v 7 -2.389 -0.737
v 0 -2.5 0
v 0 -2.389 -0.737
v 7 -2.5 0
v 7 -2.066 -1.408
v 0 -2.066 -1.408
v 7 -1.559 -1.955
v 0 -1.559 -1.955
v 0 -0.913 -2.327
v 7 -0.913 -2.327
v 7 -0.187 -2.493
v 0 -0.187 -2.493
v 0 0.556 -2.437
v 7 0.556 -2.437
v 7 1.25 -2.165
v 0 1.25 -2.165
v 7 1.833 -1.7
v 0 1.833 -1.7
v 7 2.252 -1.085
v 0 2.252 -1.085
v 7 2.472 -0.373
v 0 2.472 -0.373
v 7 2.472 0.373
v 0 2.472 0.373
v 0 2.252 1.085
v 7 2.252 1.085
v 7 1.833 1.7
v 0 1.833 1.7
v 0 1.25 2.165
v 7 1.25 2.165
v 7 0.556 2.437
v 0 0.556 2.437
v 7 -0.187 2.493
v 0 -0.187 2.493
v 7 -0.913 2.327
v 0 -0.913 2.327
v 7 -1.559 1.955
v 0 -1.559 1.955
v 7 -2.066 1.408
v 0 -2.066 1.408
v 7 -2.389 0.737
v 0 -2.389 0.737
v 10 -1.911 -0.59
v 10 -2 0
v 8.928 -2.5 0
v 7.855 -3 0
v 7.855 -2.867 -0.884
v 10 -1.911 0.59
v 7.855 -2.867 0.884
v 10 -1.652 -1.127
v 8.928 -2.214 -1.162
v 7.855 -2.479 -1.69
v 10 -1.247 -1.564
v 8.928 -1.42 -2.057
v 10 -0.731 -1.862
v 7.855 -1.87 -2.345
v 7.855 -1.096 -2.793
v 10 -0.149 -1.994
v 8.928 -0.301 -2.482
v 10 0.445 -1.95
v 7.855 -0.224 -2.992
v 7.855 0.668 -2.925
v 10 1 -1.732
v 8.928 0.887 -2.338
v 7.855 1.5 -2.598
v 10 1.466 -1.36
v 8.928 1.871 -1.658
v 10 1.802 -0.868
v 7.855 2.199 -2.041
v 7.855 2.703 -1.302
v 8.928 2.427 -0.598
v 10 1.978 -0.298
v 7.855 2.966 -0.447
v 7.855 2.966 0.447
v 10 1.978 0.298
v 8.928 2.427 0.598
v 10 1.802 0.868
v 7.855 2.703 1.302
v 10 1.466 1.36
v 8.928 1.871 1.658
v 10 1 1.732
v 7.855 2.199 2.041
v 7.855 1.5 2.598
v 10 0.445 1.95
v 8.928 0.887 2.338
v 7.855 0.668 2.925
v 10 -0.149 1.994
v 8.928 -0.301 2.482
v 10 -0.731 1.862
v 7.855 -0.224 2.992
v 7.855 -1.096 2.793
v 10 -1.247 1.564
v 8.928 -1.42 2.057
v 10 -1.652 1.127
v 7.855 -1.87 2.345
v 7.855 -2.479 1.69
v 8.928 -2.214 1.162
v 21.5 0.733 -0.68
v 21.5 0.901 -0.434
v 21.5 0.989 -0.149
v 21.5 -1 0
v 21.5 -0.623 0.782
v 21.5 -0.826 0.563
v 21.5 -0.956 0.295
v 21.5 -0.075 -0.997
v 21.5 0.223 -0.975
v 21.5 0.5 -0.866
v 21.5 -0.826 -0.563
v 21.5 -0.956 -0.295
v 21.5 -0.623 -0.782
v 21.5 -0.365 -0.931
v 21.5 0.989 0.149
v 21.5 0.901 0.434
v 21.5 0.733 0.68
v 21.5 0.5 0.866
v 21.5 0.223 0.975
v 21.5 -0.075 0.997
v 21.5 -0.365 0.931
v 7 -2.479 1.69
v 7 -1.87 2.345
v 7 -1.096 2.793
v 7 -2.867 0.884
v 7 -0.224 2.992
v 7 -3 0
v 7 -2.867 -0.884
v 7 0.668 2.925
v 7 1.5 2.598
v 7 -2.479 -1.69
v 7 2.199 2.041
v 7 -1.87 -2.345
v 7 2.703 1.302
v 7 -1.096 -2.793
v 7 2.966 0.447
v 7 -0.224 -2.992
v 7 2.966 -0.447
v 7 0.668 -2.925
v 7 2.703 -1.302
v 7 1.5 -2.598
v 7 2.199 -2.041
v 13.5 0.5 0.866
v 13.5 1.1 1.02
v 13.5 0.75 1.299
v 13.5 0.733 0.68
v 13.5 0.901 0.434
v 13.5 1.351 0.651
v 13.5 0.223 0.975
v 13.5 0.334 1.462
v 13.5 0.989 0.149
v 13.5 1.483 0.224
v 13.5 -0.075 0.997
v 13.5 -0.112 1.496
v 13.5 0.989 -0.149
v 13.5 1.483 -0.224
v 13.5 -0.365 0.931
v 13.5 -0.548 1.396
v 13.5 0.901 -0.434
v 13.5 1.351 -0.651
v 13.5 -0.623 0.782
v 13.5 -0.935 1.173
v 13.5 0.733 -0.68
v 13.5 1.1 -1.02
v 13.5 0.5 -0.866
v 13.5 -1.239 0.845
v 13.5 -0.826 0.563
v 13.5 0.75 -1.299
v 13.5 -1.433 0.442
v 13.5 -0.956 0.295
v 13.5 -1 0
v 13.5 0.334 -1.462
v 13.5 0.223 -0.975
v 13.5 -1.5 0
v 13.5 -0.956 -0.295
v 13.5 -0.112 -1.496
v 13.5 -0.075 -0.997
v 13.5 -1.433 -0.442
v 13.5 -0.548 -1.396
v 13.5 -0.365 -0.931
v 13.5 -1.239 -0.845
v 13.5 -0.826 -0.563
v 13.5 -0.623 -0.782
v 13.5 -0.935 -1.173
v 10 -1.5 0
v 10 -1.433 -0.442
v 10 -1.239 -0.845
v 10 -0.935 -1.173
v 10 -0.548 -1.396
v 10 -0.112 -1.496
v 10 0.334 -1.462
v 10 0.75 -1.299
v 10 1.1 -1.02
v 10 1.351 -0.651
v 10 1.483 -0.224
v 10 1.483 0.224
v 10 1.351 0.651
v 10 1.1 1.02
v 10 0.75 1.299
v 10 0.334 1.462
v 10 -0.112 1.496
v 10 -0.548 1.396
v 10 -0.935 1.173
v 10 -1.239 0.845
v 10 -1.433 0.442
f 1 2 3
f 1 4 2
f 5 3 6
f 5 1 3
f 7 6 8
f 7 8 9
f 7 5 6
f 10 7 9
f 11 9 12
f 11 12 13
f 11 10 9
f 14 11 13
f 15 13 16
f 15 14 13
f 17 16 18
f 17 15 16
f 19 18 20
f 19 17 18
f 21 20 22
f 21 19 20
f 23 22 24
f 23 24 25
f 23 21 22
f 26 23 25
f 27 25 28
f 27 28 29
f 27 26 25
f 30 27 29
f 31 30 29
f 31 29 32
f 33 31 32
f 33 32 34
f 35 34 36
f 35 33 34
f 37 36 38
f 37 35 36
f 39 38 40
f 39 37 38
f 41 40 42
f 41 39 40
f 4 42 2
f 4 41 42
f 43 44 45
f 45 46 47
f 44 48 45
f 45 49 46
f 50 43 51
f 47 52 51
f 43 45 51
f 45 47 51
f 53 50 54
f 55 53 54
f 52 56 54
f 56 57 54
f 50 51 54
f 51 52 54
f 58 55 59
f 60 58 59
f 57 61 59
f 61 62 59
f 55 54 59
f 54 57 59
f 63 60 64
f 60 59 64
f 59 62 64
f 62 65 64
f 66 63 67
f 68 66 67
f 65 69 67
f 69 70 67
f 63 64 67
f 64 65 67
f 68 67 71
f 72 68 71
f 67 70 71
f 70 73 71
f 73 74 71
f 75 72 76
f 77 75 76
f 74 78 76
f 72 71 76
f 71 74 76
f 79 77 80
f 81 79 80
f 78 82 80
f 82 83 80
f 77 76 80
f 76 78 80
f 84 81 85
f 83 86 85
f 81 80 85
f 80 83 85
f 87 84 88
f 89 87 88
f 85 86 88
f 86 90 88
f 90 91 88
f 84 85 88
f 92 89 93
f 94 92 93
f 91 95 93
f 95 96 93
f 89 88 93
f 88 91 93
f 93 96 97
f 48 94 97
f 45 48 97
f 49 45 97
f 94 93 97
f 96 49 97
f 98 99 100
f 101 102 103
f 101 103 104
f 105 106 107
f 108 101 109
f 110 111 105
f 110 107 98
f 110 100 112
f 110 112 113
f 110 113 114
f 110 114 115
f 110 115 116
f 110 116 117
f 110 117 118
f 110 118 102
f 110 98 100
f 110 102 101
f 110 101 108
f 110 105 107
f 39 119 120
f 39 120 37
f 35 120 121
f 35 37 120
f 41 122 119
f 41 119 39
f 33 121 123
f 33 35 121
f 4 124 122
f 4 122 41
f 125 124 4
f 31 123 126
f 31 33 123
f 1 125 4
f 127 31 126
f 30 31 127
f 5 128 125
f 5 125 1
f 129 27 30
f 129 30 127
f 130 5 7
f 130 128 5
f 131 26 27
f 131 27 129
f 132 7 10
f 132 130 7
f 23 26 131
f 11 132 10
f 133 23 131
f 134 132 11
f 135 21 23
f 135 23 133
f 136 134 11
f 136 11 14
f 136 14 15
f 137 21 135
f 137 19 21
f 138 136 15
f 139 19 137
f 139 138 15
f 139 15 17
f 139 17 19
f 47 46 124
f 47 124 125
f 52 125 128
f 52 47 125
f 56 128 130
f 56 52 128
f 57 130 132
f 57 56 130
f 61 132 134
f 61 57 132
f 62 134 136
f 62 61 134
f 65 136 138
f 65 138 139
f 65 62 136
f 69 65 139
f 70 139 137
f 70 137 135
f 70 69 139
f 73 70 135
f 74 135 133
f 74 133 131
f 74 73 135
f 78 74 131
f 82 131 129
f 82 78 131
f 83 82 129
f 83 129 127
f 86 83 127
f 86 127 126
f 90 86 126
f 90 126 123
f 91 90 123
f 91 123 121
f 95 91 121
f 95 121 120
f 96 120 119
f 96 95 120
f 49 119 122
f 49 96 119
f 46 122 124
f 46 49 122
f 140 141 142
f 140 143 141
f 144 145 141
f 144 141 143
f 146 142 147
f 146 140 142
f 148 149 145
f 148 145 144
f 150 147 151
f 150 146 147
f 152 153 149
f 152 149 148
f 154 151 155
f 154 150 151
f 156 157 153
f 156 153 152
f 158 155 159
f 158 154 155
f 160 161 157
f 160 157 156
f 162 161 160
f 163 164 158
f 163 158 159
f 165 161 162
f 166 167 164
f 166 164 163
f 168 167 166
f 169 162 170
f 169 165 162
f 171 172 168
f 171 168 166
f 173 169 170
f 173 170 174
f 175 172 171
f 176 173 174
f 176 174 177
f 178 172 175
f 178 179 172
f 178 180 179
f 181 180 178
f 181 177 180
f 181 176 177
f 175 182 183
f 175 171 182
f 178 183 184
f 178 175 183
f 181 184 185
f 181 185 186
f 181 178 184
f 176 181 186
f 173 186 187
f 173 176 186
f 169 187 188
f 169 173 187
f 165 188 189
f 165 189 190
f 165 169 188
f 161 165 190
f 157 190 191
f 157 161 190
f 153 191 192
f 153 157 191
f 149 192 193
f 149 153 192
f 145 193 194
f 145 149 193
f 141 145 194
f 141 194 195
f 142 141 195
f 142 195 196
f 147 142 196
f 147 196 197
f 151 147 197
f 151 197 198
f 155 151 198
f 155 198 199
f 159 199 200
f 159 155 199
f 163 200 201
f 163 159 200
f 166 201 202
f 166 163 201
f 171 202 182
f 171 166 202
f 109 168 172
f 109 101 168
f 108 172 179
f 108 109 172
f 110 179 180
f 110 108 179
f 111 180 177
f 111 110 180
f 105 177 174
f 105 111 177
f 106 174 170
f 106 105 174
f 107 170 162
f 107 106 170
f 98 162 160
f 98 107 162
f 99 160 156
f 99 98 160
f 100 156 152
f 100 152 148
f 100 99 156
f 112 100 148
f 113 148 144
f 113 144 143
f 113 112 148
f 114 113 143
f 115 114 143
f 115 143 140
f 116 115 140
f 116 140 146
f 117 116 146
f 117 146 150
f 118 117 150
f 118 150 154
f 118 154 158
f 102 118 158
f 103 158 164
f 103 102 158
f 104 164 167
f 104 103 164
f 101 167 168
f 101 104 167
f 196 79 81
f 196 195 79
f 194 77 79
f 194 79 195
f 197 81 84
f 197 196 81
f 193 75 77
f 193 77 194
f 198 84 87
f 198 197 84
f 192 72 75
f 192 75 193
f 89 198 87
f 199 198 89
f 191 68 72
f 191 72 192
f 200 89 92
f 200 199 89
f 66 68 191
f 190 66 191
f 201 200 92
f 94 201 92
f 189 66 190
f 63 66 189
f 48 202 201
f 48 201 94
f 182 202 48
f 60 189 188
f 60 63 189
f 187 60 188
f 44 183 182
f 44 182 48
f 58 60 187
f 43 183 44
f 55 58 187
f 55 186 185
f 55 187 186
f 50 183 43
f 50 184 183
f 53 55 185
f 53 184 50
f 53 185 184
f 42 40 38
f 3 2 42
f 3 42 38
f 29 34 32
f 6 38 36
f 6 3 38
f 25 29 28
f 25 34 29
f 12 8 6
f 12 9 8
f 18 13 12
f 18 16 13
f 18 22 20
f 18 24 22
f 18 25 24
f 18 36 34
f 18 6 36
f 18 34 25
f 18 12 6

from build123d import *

# Parameters (mm, degrees)
CHANFREIN2_SIZE  = 1
CHANFREIN2_SIZE2 = 2.144506921


with BuildPart() as part:
    # Esquisse1 → Révolution16 (revolve)
    with BuildSketch(Plane.XY, mode=Mode.PRIVATE) as r_volution16_sk:
        Polygon((7, 3), (10, 3), (10, 1.5), (13.5, 1.5), (13.5, 1), (21.5, 1), (21.5, 0), (0, 0), (0, 2.5), (7, 2.5), align=None)
    revolve(r_volution16_sk.sketch.rotate(Axis((0, 0, 0), (1, 0, 0)), 180), axis=Axis((0, 0, 0), (1, 0, 0)))

    # Chanfrein2
    chanfrein2_edges = [part.edges().sort_by_distance(p)[0] for p in [
        (10, 3, 0),
    ]]
    chanfrein2_side = [part.faces().sort_by_distance(p)[0] for p in [
        (10, 2.915147186, 0),
    ]]
    chamfer(chanfrein2_edges, length=CHANFREIN2_SIZE, length2=CHANFREIN2_SIZE2, reference=chanfrein2_side[0])


solid = part.part
